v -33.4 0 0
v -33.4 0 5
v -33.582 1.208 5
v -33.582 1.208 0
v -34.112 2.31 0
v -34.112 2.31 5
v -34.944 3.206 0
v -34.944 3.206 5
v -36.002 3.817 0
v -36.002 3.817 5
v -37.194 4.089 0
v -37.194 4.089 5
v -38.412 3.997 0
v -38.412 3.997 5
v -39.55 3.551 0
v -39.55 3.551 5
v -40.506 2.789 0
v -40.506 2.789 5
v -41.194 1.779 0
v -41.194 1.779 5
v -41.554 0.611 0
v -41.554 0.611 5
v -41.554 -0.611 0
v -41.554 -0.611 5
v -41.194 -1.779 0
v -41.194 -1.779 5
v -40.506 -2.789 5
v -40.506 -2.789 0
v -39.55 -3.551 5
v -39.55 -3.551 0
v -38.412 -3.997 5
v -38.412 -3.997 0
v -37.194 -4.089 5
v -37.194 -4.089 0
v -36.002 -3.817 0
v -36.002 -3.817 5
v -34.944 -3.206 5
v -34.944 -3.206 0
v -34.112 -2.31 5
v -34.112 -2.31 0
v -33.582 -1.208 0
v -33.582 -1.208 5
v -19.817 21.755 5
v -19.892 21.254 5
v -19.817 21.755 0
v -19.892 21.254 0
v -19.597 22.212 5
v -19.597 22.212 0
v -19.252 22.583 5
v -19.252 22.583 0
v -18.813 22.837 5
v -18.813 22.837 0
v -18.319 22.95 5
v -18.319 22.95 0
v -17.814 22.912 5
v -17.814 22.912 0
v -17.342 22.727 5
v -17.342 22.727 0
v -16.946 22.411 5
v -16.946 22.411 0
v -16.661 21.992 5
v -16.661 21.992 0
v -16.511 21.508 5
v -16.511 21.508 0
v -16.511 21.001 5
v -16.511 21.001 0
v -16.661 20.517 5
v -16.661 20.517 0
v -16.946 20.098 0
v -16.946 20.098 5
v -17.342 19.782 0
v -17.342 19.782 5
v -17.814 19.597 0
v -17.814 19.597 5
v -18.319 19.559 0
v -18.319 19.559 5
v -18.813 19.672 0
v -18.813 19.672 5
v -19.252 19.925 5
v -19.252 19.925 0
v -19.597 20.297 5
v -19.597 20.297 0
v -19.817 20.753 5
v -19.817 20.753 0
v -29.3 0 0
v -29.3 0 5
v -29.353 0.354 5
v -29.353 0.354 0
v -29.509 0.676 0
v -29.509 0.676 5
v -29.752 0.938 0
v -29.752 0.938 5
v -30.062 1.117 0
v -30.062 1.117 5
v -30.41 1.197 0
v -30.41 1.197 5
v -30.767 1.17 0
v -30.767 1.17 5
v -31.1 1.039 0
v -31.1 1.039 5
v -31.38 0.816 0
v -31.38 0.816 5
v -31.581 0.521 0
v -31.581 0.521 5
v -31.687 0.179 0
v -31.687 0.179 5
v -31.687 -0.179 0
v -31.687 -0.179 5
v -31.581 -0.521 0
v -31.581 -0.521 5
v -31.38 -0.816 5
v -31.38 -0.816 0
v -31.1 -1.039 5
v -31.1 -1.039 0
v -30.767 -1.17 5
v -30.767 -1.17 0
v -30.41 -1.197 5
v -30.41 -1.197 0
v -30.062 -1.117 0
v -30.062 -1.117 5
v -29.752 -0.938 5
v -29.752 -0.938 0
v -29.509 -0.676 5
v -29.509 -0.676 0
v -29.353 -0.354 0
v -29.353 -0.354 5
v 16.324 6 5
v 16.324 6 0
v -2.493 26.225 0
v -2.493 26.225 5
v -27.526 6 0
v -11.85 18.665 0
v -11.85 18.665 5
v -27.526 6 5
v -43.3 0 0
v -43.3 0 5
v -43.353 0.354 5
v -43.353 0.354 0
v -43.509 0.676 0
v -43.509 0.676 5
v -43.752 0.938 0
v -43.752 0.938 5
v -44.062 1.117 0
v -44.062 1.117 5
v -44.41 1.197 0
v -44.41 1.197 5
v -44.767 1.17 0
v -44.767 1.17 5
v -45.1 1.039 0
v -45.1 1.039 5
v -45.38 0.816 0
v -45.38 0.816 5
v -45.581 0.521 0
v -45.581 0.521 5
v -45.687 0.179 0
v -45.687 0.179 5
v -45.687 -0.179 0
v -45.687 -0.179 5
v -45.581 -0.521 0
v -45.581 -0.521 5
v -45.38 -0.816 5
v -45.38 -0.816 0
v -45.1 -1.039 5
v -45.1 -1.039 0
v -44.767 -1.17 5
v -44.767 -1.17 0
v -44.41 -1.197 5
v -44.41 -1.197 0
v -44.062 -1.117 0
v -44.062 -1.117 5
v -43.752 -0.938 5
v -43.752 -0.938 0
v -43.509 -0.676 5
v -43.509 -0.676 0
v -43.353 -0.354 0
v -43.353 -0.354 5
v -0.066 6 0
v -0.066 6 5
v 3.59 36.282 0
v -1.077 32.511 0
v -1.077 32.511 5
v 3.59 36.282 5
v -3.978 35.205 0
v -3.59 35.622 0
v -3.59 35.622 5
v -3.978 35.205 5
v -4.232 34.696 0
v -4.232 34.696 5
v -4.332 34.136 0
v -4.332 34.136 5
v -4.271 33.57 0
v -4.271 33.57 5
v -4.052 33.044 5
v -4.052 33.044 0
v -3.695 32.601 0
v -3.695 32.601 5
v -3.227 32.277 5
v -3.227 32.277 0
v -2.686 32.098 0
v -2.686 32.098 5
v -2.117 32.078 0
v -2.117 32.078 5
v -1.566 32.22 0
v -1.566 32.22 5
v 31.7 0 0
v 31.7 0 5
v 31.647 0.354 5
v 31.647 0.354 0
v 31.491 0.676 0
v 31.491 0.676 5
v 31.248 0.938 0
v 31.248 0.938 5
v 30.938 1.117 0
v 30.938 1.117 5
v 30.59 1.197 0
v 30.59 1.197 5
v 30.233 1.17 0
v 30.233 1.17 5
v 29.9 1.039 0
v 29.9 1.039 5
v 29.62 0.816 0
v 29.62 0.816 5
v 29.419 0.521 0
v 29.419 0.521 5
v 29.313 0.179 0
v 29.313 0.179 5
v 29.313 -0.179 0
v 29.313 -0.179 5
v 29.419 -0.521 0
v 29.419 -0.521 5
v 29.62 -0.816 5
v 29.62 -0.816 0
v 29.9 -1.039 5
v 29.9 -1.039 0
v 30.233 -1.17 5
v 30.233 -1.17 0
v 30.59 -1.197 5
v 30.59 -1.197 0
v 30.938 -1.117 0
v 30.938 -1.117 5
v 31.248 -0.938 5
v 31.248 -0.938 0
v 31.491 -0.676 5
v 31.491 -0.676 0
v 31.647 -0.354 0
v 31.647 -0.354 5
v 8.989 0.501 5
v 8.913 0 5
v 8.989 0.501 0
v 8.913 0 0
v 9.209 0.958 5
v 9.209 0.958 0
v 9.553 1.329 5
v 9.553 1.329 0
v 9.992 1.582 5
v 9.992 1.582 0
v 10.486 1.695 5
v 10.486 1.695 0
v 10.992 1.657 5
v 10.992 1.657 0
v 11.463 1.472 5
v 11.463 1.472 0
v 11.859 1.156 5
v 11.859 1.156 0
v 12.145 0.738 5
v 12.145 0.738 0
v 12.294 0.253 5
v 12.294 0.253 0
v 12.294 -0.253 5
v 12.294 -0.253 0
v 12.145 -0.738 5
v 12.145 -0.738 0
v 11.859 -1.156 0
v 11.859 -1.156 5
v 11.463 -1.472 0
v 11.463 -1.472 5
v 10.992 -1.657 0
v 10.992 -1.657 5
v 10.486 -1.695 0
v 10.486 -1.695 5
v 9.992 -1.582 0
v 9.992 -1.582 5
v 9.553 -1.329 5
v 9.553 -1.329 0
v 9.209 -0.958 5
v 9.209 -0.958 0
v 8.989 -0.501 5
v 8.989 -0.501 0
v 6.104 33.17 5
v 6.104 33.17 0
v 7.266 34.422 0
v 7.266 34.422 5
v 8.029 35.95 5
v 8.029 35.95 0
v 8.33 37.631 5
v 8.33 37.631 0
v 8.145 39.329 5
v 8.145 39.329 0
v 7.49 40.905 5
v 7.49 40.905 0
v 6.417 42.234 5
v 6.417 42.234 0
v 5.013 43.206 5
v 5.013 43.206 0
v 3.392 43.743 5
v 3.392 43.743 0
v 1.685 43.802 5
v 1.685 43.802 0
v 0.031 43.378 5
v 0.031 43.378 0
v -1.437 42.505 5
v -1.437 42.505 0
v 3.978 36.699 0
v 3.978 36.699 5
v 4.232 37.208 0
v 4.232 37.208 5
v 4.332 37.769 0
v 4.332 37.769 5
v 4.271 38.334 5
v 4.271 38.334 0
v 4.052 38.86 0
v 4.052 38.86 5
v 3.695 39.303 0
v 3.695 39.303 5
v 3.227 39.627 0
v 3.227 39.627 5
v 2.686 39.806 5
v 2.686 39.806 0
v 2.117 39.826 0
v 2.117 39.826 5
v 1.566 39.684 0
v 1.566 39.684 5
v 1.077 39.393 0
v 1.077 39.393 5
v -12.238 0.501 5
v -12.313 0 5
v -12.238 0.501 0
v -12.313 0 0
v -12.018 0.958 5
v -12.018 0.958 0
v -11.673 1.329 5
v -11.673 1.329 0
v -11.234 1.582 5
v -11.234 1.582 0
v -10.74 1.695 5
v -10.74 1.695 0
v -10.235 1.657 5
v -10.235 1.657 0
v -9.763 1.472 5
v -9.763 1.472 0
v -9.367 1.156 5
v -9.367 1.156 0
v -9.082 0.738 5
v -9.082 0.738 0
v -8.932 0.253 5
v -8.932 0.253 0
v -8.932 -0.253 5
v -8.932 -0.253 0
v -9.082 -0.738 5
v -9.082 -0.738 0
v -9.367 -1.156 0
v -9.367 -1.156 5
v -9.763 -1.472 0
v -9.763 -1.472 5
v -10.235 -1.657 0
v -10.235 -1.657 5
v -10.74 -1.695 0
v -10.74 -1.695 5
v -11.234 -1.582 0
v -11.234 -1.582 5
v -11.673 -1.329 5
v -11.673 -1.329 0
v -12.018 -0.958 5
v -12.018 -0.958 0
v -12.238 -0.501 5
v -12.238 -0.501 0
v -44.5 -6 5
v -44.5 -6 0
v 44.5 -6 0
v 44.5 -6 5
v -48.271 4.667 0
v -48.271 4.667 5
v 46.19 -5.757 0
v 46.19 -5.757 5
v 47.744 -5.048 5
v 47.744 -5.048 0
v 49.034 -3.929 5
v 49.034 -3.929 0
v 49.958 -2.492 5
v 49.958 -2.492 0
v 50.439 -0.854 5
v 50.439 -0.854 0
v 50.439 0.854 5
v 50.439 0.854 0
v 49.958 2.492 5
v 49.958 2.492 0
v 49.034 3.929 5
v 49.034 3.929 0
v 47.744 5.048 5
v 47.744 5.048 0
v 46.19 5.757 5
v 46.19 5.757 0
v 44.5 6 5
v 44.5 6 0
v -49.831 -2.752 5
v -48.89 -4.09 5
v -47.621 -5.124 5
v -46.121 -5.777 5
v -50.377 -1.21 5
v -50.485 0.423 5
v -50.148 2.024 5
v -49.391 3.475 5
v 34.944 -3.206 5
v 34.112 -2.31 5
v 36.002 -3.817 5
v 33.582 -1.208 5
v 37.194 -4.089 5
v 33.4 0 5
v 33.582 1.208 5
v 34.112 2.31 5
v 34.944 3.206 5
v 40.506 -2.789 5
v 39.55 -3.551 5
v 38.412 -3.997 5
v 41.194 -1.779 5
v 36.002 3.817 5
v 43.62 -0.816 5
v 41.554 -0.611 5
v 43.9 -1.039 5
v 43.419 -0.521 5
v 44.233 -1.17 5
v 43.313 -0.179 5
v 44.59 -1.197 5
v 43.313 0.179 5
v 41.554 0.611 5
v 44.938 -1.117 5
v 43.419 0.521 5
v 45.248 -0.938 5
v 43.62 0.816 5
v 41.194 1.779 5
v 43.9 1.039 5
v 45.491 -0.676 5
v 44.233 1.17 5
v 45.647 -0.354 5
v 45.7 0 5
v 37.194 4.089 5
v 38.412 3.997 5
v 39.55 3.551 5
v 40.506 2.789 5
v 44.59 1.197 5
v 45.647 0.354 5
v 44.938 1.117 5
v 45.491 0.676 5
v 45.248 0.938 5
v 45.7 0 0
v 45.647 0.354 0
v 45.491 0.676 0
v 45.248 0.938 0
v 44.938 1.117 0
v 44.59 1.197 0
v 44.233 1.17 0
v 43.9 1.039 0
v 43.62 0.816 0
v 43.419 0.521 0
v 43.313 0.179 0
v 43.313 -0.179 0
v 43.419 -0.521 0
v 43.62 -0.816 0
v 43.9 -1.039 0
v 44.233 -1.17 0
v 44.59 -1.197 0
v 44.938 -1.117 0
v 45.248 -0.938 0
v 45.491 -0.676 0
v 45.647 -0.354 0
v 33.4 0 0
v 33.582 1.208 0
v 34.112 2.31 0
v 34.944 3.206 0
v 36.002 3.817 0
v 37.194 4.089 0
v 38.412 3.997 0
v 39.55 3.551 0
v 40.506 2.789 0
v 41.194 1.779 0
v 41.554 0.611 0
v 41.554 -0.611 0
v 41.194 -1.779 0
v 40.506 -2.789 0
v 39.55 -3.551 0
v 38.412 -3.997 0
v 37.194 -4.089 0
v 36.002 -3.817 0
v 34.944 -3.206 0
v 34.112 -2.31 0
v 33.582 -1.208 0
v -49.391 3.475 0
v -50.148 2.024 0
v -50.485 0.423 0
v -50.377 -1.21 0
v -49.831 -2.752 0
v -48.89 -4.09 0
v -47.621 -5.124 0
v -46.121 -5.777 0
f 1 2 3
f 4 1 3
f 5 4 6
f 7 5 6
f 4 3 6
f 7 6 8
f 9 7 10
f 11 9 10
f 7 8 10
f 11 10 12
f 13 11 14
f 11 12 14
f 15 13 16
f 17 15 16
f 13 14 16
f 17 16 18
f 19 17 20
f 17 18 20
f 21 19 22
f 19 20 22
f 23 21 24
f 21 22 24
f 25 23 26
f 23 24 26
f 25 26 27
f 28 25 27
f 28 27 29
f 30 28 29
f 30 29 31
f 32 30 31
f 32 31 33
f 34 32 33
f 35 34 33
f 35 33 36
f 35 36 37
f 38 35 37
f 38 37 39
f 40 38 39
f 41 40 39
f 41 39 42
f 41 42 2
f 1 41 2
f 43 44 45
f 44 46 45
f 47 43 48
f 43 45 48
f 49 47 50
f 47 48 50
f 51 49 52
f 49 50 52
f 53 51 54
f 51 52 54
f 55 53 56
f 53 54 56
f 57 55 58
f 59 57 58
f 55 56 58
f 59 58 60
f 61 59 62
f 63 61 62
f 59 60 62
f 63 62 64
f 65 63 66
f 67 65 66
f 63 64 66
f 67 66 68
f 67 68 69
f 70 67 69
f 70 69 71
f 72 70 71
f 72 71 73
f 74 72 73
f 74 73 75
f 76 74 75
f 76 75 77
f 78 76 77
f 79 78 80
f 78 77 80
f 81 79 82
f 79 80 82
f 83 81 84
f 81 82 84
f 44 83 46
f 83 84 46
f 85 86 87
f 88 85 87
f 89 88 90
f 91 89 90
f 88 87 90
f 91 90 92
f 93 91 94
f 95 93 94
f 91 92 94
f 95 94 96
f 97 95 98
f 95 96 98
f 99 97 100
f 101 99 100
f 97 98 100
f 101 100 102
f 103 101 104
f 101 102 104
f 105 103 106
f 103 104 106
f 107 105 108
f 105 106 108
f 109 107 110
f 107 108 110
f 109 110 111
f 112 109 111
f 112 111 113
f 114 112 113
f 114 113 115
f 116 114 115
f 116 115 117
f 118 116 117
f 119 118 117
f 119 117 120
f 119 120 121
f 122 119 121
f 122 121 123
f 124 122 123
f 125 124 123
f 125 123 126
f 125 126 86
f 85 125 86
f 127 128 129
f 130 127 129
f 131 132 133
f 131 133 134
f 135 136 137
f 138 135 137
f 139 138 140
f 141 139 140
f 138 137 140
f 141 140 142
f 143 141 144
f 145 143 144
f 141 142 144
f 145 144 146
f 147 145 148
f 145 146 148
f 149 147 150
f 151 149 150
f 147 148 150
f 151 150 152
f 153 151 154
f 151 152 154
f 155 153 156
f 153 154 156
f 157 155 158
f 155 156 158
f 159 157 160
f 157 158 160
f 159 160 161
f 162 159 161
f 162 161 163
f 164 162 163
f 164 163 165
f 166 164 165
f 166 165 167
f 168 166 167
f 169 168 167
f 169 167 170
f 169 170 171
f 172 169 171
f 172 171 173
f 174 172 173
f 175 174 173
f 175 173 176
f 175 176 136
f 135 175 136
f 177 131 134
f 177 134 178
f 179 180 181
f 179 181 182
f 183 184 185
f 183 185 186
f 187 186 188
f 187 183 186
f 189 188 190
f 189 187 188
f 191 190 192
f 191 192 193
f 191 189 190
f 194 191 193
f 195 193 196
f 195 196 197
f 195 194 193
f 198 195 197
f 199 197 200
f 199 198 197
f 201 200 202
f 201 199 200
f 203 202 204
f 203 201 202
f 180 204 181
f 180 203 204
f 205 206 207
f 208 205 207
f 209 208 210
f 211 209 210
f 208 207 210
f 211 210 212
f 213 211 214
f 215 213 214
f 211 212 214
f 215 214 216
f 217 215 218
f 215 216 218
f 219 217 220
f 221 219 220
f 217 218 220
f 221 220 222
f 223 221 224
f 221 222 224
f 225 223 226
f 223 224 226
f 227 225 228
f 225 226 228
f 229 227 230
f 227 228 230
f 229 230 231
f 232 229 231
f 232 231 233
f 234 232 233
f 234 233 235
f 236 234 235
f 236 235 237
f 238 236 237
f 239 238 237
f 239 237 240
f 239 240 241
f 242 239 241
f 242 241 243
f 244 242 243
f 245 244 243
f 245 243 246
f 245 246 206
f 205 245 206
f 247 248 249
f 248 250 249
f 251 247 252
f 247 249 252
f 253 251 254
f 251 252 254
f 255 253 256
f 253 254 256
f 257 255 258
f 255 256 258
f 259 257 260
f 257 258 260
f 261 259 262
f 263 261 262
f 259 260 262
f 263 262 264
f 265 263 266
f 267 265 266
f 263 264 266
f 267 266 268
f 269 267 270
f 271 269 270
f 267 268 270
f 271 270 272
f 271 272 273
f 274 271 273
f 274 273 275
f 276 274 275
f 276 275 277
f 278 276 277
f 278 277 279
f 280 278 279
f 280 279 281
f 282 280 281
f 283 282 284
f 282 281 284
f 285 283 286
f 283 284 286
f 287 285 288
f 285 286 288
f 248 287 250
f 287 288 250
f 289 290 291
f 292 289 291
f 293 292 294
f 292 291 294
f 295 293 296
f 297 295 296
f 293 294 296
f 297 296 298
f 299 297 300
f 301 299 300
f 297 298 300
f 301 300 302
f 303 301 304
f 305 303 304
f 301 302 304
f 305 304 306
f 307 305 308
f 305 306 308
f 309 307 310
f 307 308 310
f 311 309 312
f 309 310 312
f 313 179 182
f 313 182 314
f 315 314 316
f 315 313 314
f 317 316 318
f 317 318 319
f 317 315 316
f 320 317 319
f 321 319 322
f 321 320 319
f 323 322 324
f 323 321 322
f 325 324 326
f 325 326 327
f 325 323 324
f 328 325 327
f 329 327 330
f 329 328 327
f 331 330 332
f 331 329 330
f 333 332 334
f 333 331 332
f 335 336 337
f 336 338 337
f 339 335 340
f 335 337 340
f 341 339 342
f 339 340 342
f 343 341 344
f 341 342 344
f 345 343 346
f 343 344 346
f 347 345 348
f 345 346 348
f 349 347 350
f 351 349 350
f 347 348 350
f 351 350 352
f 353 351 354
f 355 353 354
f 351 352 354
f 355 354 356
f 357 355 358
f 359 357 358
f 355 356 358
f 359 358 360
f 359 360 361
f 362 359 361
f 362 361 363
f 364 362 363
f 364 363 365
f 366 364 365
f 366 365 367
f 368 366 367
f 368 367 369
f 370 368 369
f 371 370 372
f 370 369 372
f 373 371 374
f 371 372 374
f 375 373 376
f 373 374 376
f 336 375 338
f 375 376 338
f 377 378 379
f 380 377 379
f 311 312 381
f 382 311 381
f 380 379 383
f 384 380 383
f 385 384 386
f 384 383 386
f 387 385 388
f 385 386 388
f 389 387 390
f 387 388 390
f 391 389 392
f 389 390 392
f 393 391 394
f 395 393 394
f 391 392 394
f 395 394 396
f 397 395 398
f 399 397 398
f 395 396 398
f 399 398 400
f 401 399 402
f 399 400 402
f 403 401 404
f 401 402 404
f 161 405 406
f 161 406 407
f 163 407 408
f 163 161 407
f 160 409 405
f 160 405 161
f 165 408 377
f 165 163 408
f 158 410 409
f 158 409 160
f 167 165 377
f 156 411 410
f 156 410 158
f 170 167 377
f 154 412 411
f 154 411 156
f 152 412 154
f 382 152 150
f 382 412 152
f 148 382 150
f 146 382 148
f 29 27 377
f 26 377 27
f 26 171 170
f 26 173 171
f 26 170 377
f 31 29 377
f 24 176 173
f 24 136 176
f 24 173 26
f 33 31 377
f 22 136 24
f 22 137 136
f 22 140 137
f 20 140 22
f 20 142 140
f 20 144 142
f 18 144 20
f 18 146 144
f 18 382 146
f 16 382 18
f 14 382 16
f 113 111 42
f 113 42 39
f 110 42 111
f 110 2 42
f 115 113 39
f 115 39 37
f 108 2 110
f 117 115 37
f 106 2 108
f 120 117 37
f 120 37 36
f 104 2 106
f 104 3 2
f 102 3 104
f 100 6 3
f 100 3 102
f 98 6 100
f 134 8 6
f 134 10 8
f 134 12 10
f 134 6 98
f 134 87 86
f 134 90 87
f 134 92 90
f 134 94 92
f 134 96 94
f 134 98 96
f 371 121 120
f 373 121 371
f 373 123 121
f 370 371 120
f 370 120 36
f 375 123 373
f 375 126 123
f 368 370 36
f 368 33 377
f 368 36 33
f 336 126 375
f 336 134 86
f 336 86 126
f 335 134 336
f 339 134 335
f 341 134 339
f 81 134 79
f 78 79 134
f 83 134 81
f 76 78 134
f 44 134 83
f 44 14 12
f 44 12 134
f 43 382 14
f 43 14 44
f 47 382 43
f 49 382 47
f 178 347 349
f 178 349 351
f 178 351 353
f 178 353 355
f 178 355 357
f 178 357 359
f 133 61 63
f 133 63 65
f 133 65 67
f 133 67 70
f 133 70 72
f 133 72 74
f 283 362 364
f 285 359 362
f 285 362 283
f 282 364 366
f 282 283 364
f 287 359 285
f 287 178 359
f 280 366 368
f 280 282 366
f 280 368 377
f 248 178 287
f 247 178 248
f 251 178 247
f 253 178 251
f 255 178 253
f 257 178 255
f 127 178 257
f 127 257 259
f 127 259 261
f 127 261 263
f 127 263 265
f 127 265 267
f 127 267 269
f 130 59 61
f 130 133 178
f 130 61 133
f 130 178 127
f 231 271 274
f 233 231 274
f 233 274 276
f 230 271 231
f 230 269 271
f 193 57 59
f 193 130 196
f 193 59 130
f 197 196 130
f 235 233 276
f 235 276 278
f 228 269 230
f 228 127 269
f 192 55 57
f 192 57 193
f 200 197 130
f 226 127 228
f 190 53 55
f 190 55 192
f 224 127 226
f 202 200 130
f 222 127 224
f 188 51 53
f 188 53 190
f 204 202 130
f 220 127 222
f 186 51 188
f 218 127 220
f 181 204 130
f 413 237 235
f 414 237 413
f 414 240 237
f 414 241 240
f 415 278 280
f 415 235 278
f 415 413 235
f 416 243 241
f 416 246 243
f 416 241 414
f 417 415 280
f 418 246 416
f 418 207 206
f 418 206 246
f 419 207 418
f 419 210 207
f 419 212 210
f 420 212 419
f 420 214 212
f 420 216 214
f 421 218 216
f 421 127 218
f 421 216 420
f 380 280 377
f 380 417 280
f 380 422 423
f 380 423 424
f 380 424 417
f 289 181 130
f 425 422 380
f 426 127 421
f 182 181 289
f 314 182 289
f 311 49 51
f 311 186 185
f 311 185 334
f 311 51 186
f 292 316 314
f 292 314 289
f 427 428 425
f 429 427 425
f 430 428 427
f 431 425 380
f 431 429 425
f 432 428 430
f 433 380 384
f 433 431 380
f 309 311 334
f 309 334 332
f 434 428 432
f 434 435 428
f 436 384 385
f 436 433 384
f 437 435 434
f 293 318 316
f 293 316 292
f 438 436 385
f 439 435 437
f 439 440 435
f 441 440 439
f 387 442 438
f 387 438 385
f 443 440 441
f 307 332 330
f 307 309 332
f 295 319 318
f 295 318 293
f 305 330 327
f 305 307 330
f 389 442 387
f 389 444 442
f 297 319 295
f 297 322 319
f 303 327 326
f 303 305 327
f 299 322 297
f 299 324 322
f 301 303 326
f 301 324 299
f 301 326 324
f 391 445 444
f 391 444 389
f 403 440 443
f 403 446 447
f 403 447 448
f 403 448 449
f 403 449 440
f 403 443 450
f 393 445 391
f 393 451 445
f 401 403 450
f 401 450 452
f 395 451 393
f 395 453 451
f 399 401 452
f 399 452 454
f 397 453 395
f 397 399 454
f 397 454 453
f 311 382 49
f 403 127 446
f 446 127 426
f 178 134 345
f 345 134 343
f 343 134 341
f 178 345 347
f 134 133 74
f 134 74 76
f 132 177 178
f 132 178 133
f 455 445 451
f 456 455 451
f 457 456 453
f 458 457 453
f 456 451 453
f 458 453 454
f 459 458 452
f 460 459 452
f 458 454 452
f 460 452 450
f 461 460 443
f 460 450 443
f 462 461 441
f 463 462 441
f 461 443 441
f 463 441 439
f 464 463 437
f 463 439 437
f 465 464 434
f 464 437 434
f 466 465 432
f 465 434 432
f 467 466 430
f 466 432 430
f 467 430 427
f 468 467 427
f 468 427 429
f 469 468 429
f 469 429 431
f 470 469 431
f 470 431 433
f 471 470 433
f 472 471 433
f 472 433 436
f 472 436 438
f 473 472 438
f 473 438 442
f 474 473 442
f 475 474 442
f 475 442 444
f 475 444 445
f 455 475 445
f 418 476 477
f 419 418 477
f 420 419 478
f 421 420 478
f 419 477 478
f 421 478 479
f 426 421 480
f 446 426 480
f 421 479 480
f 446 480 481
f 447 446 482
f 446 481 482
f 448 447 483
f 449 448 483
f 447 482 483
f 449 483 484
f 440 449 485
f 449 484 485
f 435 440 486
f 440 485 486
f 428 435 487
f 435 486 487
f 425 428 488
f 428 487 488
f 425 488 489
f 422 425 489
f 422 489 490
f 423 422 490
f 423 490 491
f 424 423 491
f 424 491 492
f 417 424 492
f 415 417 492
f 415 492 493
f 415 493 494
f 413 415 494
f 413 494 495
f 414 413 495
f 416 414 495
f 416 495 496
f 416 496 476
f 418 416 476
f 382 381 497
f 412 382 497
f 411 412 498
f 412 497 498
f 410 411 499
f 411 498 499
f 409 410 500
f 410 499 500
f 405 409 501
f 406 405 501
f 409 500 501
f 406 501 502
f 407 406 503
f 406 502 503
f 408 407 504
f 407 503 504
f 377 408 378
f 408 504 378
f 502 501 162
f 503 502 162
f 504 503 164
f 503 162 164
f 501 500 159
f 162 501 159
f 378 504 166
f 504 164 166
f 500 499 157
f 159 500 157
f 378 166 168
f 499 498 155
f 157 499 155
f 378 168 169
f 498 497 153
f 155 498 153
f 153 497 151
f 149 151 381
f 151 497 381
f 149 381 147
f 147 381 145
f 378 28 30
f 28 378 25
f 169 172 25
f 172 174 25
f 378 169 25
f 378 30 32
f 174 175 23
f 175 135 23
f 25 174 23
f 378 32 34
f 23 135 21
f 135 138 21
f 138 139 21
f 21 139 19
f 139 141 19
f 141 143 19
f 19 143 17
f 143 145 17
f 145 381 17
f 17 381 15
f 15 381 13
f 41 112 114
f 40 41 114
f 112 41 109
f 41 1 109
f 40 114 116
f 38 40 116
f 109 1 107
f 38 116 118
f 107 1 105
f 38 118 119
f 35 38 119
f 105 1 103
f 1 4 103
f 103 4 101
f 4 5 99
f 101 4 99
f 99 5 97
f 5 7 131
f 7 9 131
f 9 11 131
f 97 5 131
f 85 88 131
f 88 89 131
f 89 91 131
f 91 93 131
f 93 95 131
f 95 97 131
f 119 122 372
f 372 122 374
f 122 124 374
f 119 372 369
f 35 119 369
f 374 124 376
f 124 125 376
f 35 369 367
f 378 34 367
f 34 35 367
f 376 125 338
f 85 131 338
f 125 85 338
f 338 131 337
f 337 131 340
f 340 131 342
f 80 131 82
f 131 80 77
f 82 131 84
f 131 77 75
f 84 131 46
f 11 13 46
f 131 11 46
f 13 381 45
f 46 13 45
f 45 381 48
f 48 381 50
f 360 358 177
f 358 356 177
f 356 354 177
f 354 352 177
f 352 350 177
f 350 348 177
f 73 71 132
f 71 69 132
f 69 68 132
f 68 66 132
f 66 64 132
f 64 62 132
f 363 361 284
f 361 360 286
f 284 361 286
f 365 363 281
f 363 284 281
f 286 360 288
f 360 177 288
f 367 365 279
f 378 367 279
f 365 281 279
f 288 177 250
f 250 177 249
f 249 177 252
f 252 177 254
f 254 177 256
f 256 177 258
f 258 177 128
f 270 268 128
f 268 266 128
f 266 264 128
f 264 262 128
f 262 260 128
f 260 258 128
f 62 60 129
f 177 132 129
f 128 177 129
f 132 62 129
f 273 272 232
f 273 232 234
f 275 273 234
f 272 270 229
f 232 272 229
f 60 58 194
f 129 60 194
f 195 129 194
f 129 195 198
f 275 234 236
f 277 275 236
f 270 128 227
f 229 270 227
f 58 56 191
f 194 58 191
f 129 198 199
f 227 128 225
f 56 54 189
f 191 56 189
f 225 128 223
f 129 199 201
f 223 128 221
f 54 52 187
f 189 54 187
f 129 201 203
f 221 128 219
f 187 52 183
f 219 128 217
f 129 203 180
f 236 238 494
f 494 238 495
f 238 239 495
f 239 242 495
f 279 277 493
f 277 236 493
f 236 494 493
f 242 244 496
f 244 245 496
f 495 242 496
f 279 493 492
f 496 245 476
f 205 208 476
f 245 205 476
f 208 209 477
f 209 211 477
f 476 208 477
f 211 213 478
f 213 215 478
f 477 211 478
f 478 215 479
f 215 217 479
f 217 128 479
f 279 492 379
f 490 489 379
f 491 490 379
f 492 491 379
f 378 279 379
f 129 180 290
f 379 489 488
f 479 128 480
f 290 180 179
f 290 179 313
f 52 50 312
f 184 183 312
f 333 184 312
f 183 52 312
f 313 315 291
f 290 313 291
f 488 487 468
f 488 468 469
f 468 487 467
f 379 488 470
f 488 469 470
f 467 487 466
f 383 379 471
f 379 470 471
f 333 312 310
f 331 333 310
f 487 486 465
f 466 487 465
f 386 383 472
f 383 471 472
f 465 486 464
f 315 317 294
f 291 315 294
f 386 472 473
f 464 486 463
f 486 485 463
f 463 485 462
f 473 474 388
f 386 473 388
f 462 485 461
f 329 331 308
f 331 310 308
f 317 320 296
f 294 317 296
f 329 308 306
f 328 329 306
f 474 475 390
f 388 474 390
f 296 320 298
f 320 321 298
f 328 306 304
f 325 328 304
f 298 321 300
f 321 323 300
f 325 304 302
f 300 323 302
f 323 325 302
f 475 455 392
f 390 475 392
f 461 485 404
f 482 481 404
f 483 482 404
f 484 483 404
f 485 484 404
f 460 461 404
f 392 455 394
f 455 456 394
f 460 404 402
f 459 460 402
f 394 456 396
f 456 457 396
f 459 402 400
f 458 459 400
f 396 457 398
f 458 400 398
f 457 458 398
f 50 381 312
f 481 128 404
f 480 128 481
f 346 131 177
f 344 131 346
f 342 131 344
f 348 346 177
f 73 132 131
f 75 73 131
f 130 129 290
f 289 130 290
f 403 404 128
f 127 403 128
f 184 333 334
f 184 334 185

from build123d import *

# Parameters (mm, degrees)
BOSS_EXTRU_2_DEPTH   = 5
D_GAGEMENT_M21_D     = 2.4
D_GAGEMENT_M21_DEPTH = 10
D_GAGEMENT_M21_TIP   = 0.721032743
D_GAGEMENT_M81_D     = 8.2
D_GAGEMENT_M81_DEPTH = 10
D_GAGEMENT_M81_TIP   = 2.463528538
D_GAGEMENT_M22_D     = 2.4
D_GAGEMENT_M22_DEPTH = 10
D_GAGEMENT_M22_TIP   = 0.721032743
D_GAGEMENT_M82_D     = 8.2
D_GAGEMENT_M82_DEPTH = 10
D_GAGEMENT_M82_TIP   = 2.463528538
D_GAGEMENT_M31_D     = 3.4
D_GAGEMENT_M31_DEPTH = 5
D_GAGEMENT_M31_TIP   = 1.021463052


with BuildPart() as part:
    # Esquisse1 → Boss.-Extru.2 (new body)
    with BuildSketch(Plane.XY):
        with BuildLine():
            Line((-2.492714326, 26.224698366), (6.10421614, 33.170262072))
            ThreePointArc((6.10421614, 33.170262072), (7.000718602, 41.608051079), (-1.437070405, 42.504553542))
            Line((-1.437070405, 42.504553542), (-48.270643273, 4.667145735))
            ThreePointArc((-48.270643273, 4.667145735), (-50.15698128, -1.999640667), (-44.5, -6))
            Line((-44.5, -6), (44.5, -6))
            ThreePointArc((44.5, -6), (50.5, 0), (44.5, 6))
            Line((44.5, 6), (16.324378099, 6))
            Line((16.324378099, 6), (-2.492714326, 26.224698366))
        make_face()
        Polygon((-27.526006497, 6), (-0.066265486, 6), (-11.849799184, 18.664996768), align=None, mode=Mode.SUBTRACT)
        with BuildLine():
            ThreePointArc((-3.590453958, 35.622479779), (-3.889288112, 32.809883443), (-1.076691777, 32.511049289))
            Line((-1.076691777, 32.511049289), (3.590453958, 36.281692562))
            ThreePointArc((3.590453958, 36.281692562), (3.889288112, 39.094288898), (1.076691777, 39.393123052))
            Line((1.076691777, 39.393123052), (-3.590453958, 35.622479779))
        make_face(mode=Mode.SUBTRACT)
    extrude(amount=BOSS_EXTRU_2_DEPTH)

    # Dégagement M21
    with Locations(Plane(origin=(0, 0, 0), x_dir=(-1, 0, 0), z_dir=(0, 0, -1))):
        with Locations((44.5, 0), (30.5, 0)):
            Hole(D_GAGEMENT_M21_D / 2, depth=D_GAGEMENT_M21_DEPTH)
            with Locations((0, 0, -(D_GAGEMENT_M21_DEPTH + D_GAGEMENT_M21_TIP / 2))):  # 118° drill point
                Cone(0, D_GAGEMENT_M21_D / 2, D_GAGEMENT_M21_TIP, mode=Mode.SUBTRACT)

    # Dégagement M81
    with Locations(Plane(origin=(0, 0, 0), x_dir=(-1, 0, 0), z_dir=(0, 0, -1))):
        with Locations((37.5, 0)):
            Hole(D_GAGEMENT_M81_D / 2, depth=D_GAGEMENT_M81_DEPTH)
            with Locations((0, 0, -(D_GAGEMENT_M81_DEPTH + D_GAGEMENT_M81_TIP / 2))):  # 118° drill point
                Cone(0, D_GAGEMENT_M81_D / 2, D_GAGEMENT_M81_TIP, mode=Mode.SUBTRACT)

    # Dégagement M22
    with Locations(Plane(origin=(0, 0, 0), x_dir=(-1, 0, 0), z_dir=(0, 0, -1))):
        with Locations((-44.5, 0), (-30.5, 0)):
            Hole(D_GAGEMENT_M22_D / 2, depth=D_GAGEMENT_M22_DEPTH)
            with Locations((0, 0, -(D_GAGEMENT_M22_DEPTH + D_GAGEMENT_M22_TIP / 2))):  # 118° drill point
                Cone(0, D_GAGEMENT_M22_D / 2, D_GAGEMENT_M22_TIP, mode=Mode.SUBTRACT)

    # Dégagement M82
    with Locations(Plane.XY.offset(5)):
        with Locations((37.5, 0)):
            Hole(D_GAGEMENT_M82_D / 2, depth=D_GAGEMENT_M82_DEPTH)
            with Locations((0, 0, -(D_GAGEMENT_M82_DEPTH + D_GAGEMENT_M82_TIP / 2))):  # 118° drill point
                Cone(0, D_GAGEMENT_M82_D / 2, D_GAGEMENT_M82_TIP, mode=Mode.SUBTRACT)

    # Dégagement M31
    with Locations(Plane.XY.offset(5)):
        with Locations((-18.192282617, 21.254321849), (10.613248654, 0), (-10.613248654, 0)):
            Hole(D_GAGEMENT_M31_D / 2, depth=D_GAGEMENT_M31_DEPTH)
            with Locations((0, 0, -(D_GAGEMENT_M31_DEPTH + D_GAGEMENT_M31_TIP / 2))):  # 118° drill point
                Cone(0, D_GAGEMENT_M31_D / 2, D_GAGEMENT_M31_TIP, mode=Mode.SUBTRACT)


solid = part.part
